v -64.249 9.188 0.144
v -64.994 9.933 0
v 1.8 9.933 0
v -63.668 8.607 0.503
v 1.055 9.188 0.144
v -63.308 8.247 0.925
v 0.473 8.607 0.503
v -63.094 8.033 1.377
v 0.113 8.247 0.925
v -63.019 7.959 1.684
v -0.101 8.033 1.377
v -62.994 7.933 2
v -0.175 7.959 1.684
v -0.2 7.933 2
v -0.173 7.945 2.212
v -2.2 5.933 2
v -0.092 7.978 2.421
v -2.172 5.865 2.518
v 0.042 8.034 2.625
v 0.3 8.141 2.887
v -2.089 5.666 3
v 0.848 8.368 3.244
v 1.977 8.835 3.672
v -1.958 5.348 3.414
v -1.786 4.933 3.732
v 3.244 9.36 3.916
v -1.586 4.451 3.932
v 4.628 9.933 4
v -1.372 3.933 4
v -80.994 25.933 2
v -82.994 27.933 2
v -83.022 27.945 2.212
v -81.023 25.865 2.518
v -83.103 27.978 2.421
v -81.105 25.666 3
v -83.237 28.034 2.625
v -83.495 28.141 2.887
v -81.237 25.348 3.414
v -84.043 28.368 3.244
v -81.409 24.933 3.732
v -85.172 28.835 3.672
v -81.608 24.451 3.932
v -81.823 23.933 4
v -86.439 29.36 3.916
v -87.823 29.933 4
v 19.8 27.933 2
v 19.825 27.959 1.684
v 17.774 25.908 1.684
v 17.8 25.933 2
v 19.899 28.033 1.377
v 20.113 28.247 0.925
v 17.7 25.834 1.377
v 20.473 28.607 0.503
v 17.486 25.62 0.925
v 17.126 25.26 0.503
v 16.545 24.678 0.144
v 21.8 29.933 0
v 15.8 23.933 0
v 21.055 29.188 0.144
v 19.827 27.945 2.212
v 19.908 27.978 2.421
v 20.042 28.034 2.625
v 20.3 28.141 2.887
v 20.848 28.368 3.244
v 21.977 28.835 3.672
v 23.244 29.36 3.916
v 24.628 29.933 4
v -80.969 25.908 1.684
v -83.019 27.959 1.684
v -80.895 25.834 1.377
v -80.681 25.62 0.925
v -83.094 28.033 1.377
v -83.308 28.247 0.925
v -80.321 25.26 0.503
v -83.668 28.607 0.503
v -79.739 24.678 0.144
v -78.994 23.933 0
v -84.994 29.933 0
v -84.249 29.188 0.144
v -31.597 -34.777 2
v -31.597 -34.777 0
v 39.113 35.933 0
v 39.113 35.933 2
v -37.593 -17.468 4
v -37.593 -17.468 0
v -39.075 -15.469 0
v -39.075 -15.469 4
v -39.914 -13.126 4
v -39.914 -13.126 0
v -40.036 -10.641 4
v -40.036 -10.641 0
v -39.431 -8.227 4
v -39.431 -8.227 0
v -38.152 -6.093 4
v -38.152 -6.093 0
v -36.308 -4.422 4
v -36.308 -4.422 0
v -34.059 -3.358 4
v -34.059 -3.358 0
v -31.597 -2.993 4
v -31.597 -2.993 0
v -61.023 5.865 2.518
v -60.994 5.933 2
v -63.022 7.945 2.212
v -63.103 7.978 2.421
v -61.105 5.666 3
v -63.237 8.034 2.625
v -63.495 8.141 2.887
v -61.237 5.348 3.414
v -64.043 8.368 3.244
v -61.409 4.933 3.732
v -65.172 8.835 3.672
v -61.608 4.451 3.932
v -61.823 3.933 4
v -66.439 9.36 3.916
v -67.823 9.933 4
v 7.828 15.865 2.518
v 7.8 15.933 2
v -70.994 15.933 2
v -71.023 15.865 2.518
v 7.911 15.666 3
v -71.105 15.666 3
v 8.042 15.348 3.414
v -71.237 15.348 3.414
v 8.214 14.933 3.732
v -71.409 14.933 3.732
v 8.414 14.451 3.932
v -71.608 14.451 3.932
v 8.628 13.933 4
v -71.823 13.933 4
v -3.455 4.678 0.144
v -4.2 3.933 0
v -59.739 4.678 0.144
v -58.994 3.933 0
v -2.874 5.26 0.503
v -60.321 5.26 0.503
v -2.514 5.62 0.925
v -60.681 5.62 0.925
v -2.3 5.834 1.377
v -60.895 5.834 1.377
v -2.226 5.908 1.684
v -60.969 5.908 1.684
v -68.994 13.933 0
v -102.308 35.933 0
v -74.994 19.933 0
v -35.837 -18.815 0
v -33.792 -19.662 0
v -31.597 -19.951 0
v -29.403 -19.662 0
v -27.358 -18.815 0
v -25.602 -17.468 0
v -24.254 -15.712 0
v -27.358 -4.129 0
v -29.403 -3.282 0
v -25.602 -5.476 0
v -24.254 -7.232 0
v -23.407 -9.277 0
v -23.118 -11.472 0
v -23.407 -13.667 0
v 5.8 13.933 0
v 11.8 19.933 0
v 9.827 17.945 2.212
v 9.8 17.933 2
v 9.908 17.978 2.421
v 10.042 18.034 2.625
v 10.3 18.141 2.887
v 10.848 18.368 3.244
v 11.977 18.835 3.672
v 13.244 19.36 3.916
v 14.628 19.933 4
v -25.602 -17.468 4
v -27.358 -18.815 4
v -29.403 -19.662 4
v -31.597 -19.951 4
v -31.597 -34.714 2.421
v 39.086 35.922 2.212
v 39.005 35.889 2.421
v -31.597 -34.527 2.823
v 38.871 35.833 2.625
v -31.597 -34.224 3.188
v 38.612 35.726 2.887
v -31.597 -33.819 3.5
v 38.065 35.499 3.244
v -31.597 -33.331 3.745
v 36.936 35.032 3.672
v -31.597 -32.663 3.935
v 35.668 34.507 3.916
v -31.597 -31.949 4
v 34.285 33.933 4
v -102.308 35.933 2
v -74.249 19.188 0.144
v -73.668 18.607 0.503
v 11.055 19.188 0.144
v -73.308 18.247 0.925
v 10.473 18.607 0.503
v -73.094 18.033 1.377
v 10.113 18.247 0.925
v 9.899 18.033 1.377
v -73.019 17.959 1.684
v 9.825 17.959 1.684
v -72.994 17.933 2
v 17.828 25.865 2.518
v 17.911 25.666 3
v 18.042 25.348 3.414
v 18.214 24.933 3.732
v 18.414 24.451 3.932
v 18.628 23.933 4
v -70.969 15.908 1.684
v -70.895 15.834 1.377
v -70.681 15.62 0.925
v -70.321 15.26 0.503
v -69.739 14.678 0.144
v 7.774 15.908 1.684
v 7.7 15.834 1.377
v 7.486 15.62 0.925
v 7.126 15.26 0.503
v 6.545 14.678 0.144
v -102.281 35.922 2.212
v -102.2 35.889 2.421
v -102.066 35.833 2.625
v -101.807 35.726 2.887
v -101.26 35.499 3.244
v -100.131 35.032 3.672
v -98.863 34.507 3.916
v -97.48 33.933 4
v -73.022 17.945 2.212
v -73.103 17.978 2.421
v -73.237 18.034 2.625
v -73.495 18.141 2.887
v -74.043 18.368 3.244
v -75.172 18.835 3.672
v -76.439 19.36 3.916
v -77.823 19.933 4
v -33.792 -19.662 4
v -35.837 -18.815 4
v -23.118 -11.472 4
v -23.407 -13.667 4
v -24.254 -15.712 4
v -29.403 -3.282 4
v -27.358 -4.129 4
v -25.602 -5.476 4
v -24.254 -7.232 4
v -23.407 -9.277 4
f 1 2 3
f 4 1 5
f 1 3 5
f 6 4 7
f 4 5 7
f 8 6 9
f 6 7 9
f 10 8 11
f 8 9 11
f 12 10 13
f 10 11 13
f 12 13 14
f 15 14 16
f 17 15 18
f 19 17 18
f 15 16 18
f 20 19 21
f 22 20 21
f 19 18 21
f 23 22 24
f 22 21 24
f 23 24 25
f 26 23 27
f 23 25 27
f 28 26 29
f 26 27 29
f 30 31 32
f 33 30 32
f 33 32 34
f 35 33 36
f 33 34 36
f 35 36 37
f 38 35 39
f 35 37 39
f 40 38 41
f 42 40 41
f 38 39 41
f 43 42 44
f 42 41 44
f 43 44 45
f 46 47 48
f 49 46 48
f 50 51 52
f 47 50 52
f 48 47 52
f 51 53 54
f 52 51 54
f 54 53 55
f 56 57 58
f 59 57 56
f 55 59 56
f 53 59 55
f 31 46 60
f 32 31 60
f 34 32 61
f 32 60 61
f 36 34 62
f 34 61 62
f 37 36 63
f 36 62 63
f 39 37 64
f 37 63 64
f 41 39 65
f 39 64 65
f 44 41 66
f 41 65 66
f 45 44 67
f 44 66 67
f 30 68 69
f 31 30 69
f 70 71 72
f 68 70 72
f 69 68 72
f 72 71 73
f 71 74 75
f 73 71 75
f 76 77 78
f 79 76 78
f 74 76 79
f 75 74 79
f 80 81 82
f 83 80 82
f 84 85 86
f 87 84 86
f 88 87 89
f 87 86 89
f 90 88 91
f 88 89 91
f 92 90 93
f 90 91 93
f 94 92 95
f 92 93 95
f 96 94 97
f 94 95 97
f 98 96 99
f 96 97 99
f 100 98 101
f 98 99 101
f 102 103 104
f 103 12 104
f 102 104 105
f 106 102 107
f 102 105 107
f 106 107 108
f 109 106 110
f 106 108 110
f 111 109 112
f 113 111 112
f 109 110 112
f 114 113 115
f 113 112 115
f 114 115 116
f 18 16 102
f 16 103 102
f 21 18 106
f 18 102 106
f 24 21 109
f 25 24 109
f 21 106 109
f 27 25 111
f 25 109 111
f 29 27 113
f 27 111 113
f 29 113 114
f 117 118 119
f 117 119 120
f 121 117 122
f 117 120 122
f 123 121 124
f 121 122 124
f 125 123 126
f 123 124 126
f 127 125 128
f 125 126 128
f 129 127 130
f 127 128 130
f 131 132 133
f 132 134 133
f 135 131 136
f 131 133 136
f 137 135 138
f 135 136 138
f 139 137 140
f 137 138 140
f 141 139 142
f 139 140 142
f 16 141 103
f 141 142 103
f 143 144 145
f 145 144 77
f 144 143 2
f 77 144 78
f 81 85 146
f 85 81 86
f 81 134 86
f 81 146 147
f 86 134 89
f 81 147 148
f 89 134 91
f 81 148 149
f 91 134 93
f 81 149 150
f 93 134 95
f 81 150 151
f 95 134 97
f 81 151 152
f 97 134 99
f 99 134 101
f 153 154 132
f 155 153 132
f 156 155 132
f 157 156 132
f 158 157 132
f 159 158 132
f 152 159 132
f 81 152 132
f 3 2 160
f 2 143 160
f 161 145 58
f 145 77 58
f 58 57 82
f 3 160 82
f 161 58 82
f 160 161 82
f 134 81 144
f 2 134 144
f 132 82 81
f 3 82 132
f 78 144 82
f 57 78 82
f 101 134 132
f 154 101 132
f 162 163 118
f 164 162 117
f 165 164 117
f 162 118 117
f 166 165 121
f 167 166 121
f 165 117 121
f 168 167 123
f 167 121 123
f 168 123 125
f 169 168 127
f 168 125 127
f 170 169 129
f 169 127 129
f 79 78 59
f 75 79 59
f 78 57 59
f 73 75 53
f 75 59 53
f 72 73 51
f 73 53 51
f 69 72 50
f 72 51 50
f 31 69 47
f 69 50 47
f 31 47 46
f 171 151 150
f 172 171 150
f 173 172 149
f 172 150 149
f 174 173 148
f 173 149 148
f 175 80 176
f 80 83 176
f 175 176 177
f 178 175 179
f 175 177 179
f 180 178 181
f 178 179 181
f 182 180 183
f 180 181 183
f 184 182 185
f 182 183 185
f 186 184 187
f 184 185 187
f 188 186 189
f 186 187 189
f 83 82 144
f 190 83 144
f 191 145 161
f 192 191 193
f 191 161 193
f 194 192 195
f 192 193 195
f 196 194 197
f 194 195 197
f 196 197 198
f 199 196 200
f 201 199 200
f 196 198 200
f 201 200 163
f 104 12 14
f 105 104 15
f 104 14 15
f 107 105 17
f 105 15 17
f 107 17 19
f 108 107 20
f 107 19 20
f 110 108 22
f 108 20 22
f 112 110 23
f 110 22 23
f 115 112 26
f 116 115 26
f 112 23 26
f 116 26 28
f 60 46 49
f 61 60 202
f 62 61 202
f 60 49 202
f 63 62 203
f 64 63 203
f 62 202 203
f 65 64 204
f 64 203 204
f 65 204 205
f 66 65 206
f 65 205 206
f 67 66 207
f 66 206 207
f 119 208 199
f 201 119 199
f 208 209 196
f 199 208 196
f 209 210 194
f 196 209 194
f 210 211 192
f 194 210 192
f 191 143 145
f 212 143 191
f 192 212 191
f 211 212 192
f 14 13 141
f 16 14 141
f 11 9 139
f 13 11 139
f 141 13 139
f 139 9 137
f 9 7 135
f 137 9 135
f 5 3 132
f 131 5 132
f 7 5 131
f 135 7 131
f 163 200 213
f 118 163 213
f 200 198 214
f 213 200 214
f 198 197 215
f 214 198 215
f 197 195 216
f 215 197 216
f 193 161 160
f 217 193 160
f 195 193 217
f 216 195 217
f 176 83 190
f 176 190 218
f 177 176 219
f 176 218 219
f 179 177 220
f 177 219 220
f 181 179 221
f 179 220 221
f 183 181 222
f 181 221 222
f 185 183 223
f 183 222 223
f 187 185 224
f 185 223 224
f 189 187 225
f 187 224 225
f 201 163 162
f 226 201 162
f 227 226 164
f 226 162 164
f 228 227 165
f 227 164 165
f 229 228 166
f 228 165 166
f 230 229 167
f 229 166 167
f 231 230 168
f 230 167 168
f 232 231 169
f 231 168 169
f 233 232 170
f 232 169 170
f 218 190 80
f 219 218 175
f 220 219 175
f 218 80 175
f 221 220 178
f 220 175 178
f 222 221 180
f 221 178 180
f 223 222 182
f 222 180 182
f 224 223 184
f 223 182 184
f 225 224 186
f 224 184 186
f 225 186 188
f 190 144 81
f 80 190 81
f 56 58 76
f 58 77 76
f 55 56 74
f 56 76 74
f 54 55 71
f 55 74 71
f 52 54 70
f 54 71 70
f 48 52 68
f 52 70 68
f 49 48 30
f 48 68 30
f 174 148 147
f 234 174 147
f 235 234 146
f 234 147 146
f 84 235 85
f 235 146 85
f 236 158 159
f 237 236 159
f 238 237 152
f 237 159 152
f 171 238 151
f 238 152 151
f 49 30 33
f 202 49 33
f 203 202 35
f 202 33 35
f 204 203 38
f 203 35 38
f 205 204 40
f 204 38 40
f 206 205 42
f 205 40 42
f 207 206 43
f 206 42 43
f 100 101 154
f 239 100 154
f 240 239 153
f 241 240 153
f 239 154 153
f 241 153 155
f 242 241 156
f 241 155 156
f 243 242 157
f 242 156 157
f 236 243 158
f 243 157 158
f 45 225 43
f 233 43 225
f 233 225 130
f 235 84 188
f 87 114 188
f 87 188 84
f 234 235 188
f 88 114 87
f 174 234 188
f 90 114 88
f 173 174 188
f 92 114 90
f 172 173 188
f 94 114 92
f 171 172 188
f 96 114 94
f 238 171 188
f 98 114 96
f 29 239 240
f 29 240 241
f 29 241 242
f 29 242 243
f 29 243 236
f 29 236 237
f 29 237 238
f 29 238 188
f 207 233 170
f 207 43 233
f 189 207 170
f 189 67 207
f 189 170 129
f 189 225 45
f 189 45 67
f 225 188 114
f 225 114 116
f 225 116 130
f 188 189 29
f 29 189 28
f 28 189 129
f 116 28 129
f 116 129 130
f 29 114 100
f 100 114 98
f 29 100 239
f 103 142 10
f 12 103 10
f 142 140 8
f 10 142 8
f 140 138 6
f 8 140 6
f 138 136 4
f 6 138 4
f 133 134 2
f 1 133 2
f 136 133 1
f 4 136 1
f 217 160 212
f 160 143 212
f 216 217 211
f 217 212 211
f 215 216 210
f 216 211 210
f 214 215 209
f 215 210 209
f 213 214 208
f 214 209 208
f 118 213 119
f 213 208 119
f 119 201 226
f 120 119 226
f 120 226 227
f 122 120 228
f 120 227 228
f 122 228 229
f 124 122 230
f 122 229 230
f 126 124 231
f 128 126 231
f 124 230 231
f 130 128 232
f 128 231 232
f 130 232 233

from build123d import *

# Parameters (mm, degrees)
F1_DEPTH = 4
F2_R     = 2
F3_R     = 1.99999


# Not quite as in the source:
# - a fillet or chamfer is up to 0.001 mm smaller than in the source, because OpenCascade refuses the exact size


with BuildPart() as f1:
    # F0 (on Top) → F1 (new body)
    with BuildSketch(Plane.XY):
        Polygon((-82.9944183651, 27.933470586), (-90.9944183651, 35.933470586), (-102.3081268641, 35.933470586), (-31.5974487455, -34.7772075326), (-31.5974487455, -23.4634990336), (-37.5931606391, -17.46778714), (-60.9944183651, 5.933470586), (-62.9944183651, 7.933470586), (-70.9944183651, 15.933470586), (-72.9944183651, 17.933470586), (-80.9944183651, 25.933470586), align=None)
        with BuildLine():
            Line((-60.9944183651, 5.933470586), (-37.5931606391, -17.46778714))
            ThreePointArc((-37.5931606391, -17.46778714), (-39.4312238538, -8.2272193518), (-31.5974487455, -2.9928581702))
            Line((-31.5974487455, -2.9928581702), (-31.5974487455, 5.933470586))
            Line((-31.5974487455, 5.933470586), (-60.9944183651, 5.933470586))
        make_face()
        with BuildLine():
            Line((-31.5974487455, -19.9512923224), (-31.5974487455, -23.4634990336))
            Line((-31.5974487455, -23.4634990336), (-25.6017368518, -17.46778714))
            ThreePointArc((-25.6017368518, -17.46778714), (-28.352592851, -19.3058503546), (-31.5974487455, -19.9512923224))
        make_face()
        Polygon((39.1132293732, 35.933470586), (27.7995208742, 35.933470586), (19.7995208742, 27.933470586), (17.7995208742, 25.933470586), (9.7995208742, 17.933470586), (7.7995208742, 15.933470586), (-0.2004791258, 7.933470586), (-2.2004791258, 5.933470586), (-25.6017368518, -17.46778714), (-31.5974487455, -23.4634990336), (-31.5974487455, -34.7772075326), align=None)
        with BuildLine():
            Line((-37.5931606391, -17.46778714), (-31.5974487455, -23.4634990336))
            Line((-31.5974487455, -23.4634990336), (-31.5974487455, -19.9512923224))
            ThreePointArc((-31.5974487455, -19.9512923224), (-34.8423046399, -19.3058503546), (-37.5931606391, -17.46778714))
        make_face()
        with BuildLine():
            ThreePointArc((-23.1182316693, -11.4720752463), (-23.7636736371, -14.7169311407), (-25.6017368518, -17.46778714))
            Line((-25.6017368518, -17.46778714), (-2.2004791258, 5.933470586))
            Line((-2.2004791258, 5.933470586), (-31.5974487455, 5.933470586))
            Line((-31.5974487455, 5.933470586), (-31.5974487455, -2.9928581702))
            ThreePointArc((-31.5974487455, -2.9928581702), (-25.6017368518, -5.4763633526), (-23.1182316693, -11.4720752463))
        make_face()
        Polygon((7.7995208742, 15.933470586), (-31.5974487455, 15.933470586), (-31.5974487455, 7.933470586), (-0.2004791258, 7.933470586), align=None)
        Polygon((-31.5974487455, 7.933470586), (-31.5974487455, 15.933470586), (-70.9944183651, 15.933470586), (-62.9944183651, 7.933470586), align=None)
        Polygon((17.7995208742, 25.933470586), (-31.5974487455, 25.933470586), (-31.5974487455, 17.933470586), (9.7995208742, 17.933470586), align=None)
        Polygon((-31.5974487455, 17.933470586), (-31.5974487455, 25.933470586), (-80.9944183651, 25.933470586), (-72.9944183651, 17.933470586), align=None)
        Polygon((27.7995208742, 35.933470586), (-31.5974487455, 35.933470586), (-31.5974487455, 27.933470586), (19.7995208742, 27.933470586), align=None)
        Polygon((-31.5974487455, 27.933470586), (-31.5974487455, 35.933470586), (-90.9944183651, 35.933470586), (-82.9944183651, 27.933470586), align=None)
    extrude(amount=F1_DEPTH)

    # F2
    f2_edges = [f1.edges().sort_by_distance(p)[0] for p in [
        (-31.597449, 35.933471, 4),
        (-31.597449, 27.933471, 4),
        (-31.597449, 25.933471, 4),
        (-31.597449, 17.933471, 4),
        (-31.597449, 15.933471, 4),
        (-31.597449, 7.933471, 4),
        (-31.597449, 5.933471, 4),
        (-66.952788, 0.578132, 4),
        (3.75789, 0.578132, 4),
        (8.799521, 16.933471, 4),
        (18.799521, 26.933471, 4),
        (-1.200479, 6.933471, 4),
        (-61.994418, 6.933471, 4),
        (-71.994418, 16.933471, 4),
        (-81.994418, 26.933471, 4),
    ]]
    fillet(f2_edges, radius=F2_R)

    # F3 (radius 2 in the source; OpenCascade refuses exactly that, so slightly less here)
    f3_edges = [f1.edges().sort_by_distance(p)[0] for p in [
        (-31.597449, 27.933471, 0),
        (-31.597449, 25.933471, 0),
        (-31.597449, 7.933471, 0),
        (-31.597449, 5.933471, 0),
        (-31.597449, 17.933471, 0),
        (-31.597449, 15.933471, 0),
    ]]
    fillet(f3_edges, radius=F3_R)


solid = f1.part
